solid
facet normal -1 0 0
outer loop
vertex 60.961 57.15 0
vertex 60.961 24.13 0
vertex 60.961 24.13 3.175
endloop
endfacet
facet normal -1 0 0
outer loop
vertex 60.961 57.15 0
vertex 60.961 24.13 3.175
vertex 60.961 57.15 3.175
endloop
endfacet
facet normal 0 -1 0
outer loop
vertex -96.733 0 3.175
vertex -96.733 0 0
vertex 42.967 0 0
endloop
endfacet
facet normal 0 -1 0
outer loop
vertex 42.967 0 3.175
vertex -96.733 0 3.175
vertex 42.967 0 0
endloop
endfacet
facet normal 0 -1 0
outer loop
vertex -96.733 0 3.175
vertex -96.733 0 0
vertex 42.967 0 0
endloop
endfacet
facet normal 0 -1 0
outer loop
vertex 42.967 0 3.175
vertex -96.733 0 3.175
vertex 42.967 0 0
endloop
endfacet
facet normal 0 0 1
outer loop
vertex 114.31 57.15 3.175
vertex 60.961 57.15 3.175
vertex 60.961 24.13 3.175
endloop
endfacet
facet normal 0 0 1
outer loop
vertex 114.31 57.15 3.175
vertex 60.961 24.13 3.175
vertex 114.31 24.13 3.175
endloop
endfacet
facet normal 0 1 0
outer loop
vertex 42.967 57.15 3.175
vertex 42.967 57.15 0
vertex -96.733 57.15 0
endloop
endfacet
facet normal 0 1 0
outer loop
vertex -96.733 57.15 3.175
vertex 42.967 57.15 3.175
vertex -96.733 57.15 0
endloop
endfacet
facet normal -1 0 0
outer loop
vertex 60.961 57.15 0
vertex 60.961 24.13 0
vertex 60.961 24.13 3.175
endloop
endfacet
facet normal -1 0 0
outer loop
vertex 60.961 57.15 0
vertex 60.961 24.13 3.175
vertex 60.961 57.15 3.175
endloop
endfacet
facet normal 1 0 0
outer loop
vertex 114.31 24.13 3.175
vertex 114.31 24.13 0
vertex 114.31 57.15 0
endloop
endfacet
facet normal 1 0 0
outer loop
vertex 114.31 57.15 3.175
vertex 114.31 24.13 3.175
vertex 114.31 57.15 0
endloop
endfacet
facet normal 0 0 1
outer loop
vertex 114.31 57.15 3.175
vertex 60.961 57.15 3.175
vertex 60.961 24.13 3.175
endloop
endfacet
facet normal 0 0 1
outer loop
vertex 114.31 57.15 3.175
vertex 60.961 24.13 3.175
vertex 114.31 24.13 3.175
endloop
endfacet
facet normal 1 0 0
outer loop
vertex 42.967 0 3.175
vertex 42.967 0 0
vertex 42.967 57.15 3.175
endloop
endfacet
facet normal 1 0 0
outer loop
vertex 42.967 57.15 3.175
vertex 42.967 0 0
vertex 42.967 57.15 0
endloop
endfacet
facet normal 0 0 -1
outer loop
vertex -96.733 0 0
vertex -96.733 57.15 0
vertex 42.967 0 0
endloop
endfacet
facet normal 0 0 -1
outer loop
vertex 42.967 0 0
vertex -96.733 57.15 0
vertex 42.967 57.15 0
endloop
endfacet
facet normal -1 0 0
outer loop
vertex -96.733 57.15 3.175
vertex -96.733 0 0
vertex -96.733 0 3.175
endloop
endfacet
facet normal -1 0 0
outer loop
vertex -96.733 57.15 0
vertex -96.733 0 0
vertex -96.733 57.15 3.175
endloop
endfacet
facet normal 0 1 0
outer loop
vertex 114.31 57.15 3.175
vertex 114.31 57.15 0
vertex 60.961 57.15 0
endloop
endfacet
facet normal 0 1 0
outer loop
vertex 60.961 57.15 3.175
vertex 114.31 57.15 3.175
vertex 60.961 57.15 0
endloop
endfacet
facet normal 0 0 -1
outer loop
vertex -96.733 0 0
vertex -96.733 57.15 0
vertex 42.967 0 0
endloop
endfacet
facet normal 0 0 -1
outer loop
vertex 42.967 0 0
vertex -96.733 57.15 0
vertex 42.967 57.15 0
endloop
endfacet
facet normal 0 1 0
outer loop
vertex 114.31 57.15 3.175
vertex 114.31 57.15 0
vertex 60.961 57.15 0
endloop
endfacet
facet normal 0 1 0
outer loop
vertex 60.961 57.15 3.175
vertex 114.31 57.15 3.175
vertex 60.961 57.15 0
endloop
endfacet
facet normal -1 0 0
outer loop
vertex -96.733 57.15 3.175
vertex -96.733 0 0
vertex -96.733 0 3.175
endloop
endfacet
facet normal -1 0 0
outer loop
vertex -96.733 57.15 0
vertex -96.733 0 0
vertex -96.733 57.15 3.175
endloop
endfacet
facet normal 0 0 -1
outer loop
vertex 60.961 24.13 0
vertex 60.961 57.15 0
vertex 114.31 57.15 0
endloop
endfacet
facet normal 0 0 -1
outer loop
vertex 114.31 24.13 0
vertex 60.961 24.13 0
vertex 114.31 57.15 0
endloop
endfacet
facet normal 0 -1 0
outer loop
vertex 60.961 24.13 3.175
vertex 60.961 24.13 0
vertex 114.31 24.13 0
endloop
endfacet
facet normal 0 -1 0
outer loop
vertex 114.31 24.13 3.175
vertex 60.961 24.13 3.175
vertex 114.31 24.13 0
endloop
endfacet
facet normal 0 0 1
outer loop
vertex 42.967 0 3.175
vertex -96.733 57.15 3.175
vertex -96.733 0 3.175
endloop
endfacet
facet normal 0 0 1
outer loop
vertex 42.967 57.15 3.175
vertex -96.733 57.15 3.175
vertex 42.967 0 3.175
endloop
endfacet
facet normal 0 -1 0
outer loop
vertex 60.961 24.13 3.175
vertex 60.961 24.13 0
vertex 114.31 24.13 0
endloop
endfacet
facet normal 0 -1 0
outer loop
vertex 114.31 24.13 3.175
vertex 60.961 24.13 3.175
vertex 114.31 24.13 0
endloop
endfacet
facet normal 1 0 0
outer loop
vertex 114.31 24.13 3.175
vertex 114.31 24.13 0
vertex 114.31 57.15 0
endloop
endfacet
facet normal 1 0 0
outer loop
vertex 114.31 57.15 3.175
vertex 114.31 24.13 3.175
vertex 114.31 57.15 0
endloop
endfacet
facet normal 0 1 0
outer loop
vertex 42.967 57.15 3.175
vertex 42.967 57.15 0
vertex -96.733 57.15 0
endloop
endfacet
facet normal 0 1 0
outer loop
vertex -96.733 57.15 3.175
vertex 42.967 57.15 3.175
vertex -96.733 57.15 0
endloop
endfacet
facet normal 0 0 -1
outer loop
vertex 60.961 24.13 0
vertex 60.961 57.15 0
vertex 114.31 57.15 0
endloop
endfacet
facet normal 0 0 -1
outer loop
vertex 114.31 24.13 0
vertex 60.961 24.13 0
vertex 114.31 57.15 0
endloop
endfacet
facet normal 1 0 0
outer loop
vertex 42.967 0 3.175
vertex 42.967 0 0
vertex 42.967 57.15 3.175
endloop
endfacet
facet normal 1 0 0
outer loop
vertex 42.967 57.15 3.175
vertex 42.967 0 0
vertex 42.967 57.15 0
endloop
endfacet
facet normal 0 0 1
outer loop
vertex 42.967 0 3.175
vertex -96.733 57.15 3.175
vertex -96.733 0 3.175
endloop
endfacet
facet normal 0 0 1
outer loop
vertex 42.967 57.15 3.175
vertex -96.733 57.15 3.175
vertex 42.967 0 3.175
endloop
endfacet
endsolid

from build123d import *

# Parameters (mm, degrees)
F0_W     = 13.97
F0_H     = 57.15
F0_W_2   = 8.899627
F0_H_2   = 33.02
F0_W_3   = 8.89
F1_DEPTH = 3.175
F2_DEPTH = 3.175


with BuildPart() as f1:
    # F0 (on Top) → F1 (new body)
    with BuildSketch(Plane.XY):
        with Locations((-89.748095, 28.575)):
            Rectangle(F0_W, F0_H)
        with Locations((-75.778095, 28.575)):
            Rectangle(F0_W, F0_H)
        with Locations((-61.808095, 28.575)):
            Rectangle(F0_W, F0_H)
        with Locations((-47.838095, 28.575)):
            Rectangle(F0_W, F0_H)
        with Locations((-33.868095, 28.575)):
            Rectangle(F0_W, F0_H)
        with Locations((-19.898095, 28.575)):
            Rectangle(F0_W, F0_H)
        with Locations((-5.928095, 28.575)):
            Rectangle(F0_W, F0_H)
        with Locations((8.041905, 28.575)):
            Rectangle(F0_W, F0_H)
        with Locations((22.011905, 28.575)):
            Rectangle(F0_W, F0_H)
        with Locations((35.981905, 28.575)):
            Rectangle(F0_W, F0_H)
        with Locations((65.410607, 40.64)):
            Rectangle(F0_W_2, F0_H_2)
        with Locations((74.30542, 40.64)):
            Rectangle(F0_W_3, F0_H_2)
        with Locations((83.19542, 40.64)):
            Rectangle(F0_W_3, F0_H_2)
        with Locations((92.08542, 40.64)):
            Rectangle(F0_W_3, F0_H_2)
        with Locations((100.97542, 40.64)):
            Rectangle(F0_W_3, F0_H_2)
        with Locations((109.86542, 40.64)):
            Rectangle(F0_W_3, F0_H_2)
    extrude(amount=F1_DEPTH)


with BuildPart() as f2:
    # F0 (on Top) → F2 (new body)
    with BuildSketch(Plane.XY):
        with Locations((-89.748095, 28.575)):
            Rectangle(F0_W, F0_H)
        with Locations((-75.778095, 28.575)):
            Rectangle(F0_W, F0_H)
        with Locations((-61.808095, 28.575)):
            Rectangle(F0_W, F0_H)
        with Locations((-47.838095, 28.575)):
            Rectangle(F0_W, F0_H)
        with Locations((-33.868095, 28.575)):
            Rectangle(F0_W, F0_H)
        with Locations((-19.898095, 28.575)):
            Rectangle(F0_W, F0_H)
        with Locations((-5.928095, 28.575)):
            Rectangle(F0_W, F0_H)
        with Locations((8.041905, 28.575)):
            Rectangle(F0_W, F0_H)
        with Locations((22.011905, 28.575)):
            Rectangle(F0_W, F0_H)
        with Locations((35.981905, 28.575)):
            Rectangle(F0_W, F0_H)
        with Locations((65.410607, 40.64)):
            Rectangle(F0_W_2, F0_H_2)
        with Locations((74.30542, 40.64)):
            Rectangle(F0_W_3, F0_H_2)
        with Locations((83.19542, 40.64)):
            Rectangle(F0_W_3, F0_H_2)
        with Locations((92.08542, 40.64)):
            Rectangle(F0_W_3, F0_H_2)
        with Locations((100.97542, 40.64)):
            Rectangle(F0_W_3, F0_H_2)
        with Locations((109.86542, 40.64)):
            Rectangle(F0_W_3, F0_H_2)
    extrude(amount=F2_DEPTH)


solid = Compound([f1.part, f2.part])
